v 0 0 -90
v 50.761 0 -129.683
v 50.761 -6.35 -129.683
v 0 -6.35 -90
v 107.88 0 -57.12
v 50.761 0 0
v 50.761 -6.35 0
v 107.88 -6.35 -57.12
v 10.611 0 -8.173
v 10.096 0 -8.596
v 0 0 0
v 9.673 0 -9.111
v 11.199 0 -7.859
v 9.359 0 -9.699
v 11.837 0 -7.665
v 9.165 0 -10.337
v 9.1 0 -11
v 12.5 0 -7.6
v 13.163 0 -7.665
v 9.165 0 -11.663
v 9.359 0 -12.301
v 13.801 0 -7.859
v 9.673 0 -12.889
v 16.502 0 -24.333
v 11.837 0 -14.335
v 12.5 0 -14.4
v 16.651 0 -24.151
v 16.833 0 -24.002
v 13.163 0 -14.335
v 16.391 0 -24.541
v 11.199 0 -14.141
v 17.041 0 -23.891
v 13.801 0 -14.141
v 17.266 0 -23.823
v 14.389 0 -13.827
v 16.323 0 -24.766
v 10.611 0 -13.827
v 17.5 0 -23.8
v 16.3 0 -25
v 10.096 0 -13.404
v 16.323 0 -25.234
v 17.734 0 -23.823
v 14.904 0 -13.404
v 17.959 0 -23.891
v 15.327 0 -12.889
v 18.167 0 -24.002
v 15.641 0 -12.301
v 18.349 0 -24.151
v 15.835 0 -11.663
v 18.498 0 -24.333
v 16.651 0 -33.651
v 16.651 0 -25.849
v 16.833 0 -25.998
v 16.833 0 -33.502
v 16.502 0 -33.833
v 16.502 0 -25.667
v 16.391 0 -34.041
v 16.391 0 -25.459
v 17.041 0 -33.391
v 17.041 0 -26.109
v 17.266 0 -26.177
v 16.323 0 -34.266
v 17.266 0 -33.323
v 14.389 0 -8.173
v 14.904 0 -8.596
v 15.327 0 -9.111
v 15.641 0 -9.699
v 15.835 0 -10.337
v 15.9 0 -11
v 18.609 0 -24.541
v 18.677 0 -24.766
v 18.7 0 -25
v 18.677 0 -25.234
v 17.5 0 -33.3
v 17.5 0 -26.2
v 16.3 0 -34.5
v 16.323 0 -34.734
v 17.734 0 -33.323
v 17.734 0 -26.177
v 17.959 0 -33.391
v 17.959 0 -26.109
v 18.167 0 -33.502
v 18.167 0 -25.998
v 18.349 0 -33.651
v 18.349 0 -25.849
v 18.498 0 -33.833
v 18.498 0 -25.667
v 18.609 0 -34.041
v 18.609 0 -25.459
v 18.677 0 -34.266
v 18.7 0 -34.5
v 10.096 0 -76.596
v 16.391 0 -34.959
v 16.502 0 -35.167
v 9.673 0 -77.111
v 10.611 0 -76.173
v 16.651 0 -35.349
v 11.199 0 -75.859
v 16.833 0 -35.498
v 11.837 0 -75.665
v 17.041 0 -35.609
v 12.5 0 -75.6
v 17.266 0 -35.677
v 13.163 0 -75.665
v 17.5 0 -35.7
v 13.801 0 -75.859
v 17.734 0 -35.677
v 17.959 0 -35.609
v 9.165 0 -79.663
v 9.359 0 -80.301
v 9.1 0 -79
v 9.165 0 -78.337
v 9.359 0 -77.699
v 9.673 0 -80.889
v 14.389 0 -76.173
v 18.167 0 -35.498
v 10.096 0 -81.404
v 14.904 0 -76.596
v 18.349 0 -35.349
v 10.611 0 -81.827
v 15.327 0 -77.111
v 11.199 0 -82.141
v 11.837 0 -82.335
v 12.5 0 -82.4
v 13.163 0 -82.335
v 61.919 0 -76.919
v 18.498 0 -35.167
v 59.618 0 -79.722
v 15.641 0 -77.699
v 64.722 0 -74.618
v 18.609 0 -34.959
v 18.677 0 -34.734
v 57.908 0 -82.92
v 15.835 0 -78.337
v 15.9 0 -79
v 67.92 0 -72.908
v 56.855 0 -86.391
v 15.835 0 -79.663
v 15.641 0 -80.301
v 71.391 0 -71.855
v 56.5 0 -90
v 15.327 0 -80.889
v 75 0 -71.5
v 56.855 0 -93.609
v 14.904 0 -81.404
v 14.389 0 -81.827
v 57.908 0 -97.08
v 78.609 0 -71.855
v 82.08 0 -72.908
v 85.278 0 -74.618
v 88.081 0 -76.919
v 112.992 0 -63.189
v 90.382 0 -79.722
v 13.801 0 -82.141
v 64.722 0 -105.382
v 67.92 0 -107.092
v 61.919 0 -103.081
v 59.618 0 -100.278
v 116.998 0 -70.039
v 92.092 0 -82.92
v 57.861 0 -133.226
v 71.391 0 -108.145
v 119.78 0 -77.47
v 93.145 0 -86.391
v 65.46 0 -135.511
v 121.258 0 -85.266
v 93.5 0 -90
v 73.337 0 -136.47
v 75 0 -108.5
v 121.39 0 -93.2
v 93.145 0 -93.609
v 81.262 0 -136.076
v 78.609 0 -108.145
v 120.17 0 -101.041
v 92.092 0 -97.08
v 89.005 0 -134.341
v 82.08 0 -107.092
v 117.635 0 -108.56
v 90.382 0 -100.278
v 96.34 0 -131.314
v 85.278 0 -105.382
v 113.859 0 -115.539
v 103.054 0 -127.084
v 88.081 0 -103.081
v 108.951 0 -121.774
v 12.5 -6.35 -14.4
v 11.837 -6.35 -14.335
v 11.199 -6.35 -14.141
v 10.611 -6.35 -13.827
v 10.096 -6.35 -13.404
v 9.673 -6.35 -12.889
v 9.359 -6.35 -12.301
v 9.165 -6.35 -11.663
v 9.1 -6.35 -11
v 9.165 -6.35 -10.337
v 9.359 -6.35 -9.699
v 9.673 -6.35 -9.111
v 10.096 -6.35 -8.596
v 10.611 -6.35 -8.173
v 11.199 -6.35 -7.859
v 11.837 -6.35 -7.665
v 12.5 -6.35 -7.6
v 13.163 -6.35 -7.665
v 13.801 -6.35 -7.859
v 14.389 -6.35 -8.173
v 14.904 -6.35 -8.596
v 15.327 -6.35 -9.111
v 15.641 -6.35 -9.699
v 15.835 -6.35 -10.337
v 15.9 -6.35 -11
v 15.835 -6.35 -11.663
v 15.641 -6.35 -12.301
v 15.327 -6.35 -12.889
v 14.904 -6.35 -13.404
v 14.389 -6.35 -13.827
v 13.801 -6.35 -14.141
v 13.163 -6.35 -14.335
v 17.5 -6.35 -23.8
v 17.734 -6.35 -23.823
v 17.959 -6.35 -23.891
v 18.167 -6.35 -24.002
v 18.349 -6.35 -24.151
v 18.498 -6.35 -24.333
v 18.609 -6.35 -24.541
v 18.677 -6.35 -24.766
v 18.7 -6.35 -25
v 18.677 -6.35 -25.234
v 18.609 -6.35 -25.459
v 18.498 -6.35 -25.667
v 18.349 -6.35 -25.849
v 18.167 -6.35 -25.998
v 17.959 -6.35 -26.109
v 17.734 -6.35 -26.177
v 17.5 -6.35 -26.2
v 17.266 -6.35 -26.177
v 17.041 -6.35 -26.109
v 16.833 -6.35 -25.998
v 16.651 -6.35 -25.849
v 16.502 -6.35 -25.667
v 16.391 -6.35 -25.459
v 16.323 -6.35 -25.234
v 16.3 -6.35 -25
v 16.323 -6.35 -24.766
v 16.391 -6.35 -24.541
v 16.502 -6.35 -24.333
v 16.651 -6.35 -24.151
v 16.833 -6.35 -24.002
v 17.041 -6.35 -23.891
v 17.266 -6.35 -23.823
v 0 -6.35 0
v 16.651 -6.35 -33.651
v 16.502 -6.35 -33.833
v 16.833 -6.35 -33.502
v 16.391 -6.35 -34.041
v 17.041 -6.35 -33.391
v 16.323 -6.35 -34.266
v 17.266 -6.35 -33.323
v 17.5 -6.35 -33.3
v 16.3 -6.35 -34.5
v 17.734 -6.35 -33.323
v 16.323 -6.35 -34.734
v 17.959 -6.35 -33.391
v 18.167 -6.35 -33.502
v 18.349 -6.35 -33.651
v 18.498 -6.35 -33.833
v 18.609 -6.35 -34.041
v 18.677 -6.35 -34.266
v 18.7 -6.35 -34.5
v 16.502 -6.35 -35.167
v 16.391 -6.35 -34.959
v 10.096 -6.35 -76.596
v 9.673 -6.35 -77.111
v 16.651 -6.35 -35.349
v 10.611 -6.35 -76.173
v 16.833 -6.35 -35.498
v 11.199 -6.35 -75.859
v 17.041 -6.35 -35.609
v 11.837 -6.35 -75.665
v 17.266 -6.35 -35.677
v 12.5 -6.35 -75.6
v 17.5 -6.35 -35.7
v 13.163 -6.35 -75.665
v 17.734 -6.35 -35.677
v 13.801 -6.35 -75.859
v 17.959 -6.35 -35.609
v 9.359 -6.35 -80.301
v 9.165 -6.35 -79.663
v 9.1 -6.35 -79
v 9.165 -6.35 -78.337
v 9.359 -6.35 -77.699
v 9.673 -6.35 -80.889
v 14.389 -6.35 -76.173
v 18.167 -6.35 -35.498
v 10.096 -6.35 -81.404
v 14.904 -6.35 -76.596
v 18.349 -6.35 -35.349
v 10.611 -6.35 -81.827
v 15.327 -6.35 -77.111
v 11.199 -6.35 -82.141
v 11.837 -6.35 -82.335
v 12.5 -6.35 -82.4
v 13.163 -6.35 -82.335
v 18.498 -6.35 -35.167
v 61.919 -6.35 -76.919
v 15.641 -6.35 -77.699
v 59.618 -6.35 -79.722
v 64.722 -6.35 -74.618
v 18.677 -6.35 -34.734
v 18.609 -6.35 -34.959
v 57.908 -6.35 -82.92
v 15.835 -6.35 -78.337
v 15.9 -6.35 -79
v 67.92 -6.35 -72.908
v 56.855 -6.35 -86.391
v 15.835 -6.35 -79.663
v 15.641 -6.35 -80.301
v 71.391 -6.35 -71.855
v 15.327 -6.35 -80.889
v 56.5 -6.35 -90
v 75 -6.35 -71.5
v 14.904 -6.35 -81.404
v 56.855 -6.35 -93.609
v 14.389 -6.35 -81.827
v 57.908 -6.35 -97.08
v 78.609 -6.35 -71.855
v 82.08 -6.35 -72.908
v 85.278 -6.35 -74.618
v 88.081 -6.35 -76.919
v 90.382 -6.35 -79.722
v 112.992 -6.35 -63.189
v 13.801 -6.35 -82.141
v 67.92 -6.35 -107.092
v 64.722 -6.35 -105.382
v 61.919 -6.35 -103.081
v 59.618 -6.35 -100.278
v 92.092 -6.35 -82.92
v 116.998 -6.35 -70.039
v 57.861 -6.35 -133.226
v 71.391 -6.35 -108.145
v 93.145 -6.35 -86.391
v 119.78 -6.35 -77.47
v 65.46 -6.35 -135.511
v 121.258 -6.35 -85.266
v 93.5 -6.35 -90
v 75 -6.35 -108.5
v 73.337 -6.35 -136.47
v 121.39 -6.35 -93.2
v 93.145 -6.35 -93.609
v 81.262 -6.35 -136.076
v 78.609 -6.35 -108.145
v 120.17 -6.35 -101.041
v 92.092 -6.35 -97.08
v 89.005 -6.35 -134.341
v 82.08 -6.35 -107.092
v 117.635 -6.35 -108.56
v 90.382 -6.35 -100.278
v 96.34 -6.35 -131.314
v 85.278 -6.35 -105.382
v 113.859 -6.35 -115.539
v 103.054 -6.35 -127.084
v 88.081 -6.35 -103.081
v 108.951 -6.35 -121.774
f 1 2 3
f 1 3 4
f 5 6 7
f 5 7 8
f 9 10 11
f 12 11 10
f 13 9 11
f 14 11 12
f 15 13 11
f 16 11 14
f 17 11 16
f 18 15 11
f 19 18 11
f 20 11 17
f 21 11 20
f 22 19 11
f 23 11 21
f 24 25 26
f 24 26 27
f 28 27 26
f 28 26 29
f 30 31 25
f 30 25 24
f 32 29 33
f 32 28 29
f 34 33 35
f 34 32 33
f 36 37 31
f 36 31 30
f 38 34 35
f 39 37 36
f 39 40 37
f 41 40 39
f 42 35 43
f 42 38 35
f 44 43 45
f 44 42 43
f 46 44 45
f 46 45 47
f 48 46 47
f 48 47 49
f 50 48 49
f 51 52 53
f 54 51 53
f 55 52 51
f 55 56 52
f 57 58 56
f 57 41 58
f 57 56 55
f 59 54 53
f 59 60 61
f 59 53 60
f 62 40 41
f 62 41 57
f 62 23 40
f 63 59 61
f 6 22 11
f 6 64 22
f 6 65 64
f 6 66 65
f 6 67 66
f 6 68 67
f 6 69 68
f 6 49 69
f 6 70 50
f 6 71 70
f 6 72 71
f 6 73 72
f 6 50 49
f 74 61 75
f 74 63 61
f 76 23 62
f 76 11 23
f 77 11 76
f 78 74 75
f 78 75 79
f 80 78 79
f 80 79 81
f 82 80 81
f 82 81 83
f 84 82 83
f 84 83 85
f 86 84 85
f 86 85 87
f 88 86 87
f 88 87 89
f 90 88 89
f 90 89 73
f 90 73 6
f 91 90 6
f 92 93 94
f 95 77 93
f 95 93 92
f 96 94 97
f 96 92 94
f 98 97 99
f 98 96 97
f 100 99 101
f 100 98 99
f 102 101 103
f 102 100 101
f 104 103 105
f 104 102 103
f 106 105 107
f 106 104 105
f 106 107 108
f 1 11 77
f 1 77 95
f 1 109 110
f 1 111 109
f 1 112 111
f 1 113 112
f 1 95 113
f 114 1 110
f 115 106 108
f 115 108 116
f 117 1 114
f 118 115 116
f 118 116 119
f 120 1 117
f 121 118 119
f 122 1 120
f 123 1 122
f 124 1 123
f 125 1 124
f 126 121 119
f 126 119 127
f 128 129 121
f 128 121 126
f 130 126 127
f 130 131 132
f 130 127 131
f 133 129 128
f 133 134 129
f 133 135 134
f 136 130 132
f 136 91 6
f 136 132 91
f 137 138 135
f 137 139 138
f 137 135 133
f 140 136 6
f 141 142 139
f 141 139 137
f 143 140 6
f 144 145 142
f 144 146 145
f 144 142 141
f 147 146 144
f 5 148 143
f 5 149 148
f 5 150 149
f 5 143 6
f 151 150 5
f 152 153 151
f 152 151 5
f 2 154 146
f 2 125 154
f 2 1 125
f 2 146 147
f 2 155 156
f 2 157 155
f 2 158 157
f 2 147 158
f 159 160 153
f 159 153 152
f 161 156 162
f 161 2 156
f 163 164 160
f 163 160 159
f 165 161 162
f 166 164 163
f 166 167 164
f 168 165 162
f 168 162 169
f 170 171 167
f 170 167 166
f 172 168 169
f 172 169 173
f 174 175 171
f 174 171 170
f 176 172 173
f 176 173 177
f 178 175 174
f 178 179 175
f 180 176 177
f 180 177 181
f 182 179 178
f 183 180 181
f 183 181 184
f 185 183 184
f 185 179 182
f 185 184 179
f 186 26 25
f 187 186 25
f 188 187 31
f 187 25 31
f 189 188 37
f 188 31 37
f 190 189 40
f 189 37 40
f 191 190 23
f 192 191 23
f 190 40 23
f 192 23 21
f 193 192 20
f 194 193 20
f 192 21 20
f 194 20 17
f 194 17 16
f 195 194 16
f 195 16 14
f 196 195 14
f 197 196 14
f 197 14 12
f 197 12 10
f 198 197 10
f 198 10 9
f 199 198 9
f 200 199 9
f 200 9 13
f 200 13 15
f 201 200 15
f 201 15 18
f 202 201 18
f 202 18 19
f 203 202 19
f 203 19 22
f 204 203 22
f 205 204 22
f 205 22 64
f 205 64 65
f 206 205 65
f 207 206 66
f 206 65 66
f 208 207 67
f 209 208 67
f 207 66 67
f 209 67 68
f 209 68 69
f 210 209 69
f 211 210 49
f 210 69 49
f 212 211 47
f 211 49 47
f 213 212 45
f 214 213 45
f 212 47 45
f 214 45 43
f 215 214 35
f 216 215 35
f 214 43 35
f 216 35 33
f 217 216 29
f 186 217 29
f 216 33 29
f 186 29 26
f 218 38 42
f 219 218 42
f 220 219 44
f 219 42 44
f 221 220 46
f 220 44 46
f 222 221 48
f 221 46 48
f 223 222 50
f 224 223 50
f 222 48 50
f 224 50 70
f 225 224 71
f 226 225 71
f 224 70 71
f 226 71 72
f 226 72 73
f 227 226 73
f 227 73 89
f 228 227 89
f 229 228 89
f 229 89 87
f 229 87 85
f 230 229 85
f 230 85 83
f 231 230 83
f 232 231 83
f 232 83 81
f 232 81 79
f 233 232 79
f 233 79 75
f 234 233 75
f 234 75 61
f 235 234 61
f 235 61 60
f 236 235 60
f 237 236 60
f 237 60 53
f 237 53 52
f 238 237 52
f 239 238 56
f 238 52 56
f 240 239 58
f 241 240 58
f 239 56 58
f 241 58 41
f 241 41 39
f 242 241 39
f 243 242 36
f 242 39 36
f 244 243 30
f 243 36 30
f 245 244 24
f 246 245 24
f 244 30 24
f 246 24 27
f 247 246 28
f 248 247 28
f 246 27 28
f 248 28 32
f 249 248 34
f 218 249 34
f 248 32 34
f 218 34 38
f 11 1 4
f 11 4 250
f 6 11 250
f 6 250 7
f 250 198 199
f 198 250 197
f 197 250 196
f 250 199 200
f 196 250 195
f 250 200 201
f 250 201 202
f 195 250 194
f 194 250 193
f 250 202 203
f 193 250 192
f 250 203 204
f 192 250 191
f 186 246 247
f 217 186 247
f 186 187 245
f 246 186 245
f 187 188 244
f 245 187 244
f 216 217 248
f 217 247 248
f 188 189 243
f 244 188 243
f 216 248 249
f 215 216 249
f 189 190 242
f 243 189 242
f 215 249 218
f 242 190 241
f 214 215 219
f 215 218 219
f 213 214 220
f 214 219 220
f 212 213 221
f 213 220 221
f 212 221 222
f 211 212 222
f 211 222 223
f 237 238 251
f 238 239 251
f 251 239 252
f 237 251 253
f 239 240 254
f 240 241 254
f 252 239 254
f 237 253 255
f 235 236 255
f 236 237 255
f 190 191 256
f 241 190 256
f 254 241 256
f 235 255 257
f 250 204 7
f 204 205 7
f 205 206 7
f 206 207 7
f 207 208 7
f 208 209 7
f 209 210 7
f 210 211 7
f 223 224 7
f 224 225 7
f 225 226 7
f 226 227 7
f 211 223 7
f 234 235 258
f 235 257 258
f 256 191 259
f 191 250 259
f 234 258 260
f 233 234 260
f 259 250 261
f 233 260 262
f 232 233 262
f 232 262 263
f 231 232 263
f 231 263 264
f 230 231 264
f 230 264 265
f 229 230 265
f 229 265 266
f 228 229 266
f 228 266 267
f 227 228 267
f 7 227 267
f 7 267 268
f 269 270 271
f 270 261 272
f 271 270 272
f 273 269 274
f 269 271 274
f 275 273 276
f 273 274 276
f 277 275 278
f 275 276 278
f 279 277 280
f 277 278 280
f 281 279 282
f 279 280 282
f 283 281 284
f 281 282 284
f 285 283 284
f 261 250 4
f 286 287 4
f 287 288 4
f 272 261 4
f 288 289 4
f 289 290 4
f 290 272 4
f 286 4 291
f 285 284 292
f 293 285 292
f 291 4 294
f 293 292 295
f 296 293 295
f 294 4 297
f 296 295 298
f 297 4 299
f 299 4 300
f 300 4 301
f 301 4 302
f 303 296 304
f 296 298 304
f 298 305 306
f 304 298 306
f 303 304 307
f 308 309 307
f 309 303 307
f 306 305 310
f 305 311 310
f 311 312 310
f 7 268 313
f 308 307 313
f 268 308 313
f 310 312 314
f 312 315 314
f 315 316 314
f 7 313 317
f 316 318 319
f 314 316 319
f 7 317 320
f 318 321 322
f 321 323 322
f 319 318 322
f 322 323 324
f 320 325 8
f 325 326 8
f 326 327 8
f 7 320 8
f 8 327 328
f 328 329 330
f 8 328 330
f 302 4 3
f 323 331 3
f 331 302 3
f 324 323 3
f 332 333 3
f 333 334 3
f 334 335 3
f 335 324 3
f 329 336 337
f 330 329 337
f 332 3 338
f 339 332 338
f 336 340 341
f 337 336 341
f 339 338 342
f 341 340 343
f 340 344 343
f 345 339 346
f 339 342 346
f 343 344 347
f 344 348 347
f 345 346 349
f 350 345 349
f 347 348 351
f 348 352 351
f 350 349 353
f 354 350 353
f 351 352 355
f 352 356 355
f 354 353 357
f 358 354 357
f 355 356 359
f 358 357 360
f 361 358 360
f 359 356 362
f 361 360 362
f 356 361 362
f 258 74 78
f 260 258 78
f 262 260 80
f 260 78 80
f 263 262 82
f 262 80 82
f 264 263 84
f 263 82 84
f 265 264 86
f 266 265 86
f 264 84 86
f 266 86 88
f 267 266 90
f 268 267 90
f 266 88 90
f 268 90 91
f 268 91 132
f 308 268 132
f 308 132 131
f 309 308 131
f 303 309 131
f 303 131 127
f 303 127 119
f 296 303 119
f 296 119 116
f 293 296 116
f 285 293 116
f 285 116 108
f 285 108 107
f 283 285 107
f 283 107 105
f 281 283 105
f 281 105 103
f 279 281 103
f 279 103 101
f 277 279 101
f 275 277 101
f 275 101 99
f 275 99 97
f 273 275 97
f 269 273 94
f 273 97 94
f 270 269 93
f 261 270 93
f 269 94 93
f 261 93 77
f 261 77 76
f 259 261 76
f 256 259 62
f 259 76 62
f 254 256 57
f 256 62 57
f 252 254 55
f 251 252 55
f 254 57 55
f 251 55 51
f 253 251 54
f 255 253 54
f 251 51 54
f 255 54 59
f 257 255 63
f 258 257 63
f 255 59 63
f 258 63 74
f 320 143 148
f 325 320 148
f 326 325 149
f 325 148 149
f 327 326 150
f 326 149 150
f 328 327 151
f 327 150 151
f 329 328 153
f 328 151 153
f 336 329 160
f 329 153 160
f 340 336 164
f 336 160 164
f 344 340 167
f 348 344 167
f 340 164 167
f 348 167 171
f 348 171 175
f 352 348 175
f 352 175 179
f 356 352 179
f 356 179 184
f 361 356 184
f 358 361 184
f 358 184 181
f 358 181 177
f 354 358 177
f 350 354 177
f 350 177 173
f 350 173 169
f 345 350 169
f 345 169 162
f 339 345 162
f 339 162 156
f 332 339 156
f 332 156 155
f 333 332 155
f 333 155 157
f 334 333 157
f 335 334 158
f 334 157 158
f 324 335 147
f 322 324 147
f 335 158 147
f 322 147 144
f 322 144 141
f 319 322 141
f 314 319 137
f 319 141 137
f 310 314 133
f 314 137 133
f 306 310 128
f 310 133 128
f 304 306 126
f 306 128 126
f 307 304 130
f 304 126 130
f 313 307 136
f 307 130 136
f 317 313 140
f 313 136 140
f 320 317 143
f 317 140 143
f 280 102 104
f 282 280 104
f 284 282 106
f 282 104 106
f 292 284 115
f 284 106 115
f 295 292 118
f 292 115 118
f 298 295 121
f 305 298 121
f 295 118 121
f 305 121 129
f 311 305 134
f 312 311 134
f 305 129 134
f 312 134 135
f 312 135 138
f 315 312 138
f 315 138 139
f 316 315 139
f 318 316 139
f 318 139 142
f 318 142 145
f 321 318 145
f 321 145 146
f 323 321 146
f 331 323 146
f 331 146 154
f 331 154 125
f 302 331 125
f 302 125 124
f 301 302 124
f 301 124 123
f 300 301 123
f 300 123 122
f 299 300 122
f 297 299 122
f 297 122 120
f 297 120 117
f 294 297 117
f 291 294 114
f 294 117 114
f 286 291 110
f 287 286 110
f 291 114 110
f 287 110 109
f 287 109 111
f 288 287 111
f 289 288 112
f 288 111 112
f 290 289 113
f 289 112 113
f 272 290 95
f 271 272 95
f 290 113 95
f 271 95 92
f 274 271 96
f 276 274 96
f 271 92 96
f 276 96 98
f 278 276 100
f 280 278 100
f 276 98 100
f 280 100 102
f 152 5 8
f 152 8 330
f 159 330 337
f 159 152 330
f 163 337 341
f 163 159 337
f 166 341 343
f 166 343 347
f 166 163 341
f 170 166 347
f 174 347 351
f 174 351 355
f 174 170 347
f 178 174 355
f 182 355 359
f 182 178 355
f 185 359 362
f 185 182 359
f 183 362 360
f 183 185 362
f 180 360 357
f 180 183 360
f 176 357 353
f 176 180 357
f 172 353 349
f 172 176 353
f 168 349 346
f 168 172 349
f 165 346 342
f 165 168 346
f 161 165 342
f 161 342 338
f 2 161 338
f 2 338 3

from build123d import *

# Parameters (mm, degrees)
BASE_FLANGE1_DEPTH = 6.35
SKETCH8_R          = 3.4
CUT_EXTRUDE1_DEPTH = 183.851914127
SKETCH9_R          = 18.5
CUT_EXTRUDE2_DEPTH = 183.851914127
SKETCH11_R         = 1.2
CUT_EXTRUDE4_DEPTH = 183.851914127


# Sheet-metal steps are written as plain solids
with BuildPart() as part:
    # Sketch2 → Base-Flange1 (new body)
    with BuildSketch(Plane(origin=(0, 0, 0), x_dir=(1, 0, 0), z_dir=(0, 1, 0))):
        with BuildLine():
            Line((0, 0), (50.76093065, 0))
            Line((50.76093065, 0), (107.880465325, 57.119534675))
            ThreePointArc((107.880465325, 57.119534675), (111.537953618, 118.761570635), (50.76093065, 129.682710556))
            Line((50.76093065, 129.682710556), (0, 90))
            Line((0, 90), (0, 0))
        make_face()
    extrude(amount=-BASE_FLANGE1_DEPTH)

    # Sketch8 → Cut-Extrude1 (cut, through all)
    with BuildSketch(Plane(origin=(0, 0, 0), x_dir=(1, 0, 0), z_dir=(0, 1, 0))):
        with Locations(Location((12.5, 79, 0), (0, 0, 270))):
            Circle(SKETCH8_R)
        with Locations(Location((12.5, 11, 0), (0, 0, 90))):
            Circle(SKETCH8_R)
    extrude(amount=-CUT_EXTRUDE1_DEPTH, mode=Mode.SUBTRACT)

    # Sketch9 → Cut-Extrude2 (cut, through all)
    with BuildSketch(Plane(origin=(0, 0, 0), x_dir=(1, 0, 0), z_dir=(0, 1, 0))):
        with Locations(Location((75, 90, 0), (0, 0, 270))):
            Circle(SKETCH9_R)
    extrude(amount=-CUT_EXTRUDE2_DEPTH, mode=Mode.SUBTRACT)

    # Sketch11 → Cut-Extrude4 (cut, through all)
    with BuildSketch(Plane(origin=(0, 0, 0), x_dir=(1, 0, 0), z_dir=(0, 1, 0))):
        with Locations(Location((17.5, 25, 0), (0, 0, 270))):
            Circle(SKETCH11_R)
        with Locations(Location((17.5, 34.5, 0), (0, 0, 270))):
            Circle(SKETCH11_R)
    extrude(amount=-CUT_EXTRUDE4_DEPTH, mode=Mode.SUBTRACT)


solid = part.part
